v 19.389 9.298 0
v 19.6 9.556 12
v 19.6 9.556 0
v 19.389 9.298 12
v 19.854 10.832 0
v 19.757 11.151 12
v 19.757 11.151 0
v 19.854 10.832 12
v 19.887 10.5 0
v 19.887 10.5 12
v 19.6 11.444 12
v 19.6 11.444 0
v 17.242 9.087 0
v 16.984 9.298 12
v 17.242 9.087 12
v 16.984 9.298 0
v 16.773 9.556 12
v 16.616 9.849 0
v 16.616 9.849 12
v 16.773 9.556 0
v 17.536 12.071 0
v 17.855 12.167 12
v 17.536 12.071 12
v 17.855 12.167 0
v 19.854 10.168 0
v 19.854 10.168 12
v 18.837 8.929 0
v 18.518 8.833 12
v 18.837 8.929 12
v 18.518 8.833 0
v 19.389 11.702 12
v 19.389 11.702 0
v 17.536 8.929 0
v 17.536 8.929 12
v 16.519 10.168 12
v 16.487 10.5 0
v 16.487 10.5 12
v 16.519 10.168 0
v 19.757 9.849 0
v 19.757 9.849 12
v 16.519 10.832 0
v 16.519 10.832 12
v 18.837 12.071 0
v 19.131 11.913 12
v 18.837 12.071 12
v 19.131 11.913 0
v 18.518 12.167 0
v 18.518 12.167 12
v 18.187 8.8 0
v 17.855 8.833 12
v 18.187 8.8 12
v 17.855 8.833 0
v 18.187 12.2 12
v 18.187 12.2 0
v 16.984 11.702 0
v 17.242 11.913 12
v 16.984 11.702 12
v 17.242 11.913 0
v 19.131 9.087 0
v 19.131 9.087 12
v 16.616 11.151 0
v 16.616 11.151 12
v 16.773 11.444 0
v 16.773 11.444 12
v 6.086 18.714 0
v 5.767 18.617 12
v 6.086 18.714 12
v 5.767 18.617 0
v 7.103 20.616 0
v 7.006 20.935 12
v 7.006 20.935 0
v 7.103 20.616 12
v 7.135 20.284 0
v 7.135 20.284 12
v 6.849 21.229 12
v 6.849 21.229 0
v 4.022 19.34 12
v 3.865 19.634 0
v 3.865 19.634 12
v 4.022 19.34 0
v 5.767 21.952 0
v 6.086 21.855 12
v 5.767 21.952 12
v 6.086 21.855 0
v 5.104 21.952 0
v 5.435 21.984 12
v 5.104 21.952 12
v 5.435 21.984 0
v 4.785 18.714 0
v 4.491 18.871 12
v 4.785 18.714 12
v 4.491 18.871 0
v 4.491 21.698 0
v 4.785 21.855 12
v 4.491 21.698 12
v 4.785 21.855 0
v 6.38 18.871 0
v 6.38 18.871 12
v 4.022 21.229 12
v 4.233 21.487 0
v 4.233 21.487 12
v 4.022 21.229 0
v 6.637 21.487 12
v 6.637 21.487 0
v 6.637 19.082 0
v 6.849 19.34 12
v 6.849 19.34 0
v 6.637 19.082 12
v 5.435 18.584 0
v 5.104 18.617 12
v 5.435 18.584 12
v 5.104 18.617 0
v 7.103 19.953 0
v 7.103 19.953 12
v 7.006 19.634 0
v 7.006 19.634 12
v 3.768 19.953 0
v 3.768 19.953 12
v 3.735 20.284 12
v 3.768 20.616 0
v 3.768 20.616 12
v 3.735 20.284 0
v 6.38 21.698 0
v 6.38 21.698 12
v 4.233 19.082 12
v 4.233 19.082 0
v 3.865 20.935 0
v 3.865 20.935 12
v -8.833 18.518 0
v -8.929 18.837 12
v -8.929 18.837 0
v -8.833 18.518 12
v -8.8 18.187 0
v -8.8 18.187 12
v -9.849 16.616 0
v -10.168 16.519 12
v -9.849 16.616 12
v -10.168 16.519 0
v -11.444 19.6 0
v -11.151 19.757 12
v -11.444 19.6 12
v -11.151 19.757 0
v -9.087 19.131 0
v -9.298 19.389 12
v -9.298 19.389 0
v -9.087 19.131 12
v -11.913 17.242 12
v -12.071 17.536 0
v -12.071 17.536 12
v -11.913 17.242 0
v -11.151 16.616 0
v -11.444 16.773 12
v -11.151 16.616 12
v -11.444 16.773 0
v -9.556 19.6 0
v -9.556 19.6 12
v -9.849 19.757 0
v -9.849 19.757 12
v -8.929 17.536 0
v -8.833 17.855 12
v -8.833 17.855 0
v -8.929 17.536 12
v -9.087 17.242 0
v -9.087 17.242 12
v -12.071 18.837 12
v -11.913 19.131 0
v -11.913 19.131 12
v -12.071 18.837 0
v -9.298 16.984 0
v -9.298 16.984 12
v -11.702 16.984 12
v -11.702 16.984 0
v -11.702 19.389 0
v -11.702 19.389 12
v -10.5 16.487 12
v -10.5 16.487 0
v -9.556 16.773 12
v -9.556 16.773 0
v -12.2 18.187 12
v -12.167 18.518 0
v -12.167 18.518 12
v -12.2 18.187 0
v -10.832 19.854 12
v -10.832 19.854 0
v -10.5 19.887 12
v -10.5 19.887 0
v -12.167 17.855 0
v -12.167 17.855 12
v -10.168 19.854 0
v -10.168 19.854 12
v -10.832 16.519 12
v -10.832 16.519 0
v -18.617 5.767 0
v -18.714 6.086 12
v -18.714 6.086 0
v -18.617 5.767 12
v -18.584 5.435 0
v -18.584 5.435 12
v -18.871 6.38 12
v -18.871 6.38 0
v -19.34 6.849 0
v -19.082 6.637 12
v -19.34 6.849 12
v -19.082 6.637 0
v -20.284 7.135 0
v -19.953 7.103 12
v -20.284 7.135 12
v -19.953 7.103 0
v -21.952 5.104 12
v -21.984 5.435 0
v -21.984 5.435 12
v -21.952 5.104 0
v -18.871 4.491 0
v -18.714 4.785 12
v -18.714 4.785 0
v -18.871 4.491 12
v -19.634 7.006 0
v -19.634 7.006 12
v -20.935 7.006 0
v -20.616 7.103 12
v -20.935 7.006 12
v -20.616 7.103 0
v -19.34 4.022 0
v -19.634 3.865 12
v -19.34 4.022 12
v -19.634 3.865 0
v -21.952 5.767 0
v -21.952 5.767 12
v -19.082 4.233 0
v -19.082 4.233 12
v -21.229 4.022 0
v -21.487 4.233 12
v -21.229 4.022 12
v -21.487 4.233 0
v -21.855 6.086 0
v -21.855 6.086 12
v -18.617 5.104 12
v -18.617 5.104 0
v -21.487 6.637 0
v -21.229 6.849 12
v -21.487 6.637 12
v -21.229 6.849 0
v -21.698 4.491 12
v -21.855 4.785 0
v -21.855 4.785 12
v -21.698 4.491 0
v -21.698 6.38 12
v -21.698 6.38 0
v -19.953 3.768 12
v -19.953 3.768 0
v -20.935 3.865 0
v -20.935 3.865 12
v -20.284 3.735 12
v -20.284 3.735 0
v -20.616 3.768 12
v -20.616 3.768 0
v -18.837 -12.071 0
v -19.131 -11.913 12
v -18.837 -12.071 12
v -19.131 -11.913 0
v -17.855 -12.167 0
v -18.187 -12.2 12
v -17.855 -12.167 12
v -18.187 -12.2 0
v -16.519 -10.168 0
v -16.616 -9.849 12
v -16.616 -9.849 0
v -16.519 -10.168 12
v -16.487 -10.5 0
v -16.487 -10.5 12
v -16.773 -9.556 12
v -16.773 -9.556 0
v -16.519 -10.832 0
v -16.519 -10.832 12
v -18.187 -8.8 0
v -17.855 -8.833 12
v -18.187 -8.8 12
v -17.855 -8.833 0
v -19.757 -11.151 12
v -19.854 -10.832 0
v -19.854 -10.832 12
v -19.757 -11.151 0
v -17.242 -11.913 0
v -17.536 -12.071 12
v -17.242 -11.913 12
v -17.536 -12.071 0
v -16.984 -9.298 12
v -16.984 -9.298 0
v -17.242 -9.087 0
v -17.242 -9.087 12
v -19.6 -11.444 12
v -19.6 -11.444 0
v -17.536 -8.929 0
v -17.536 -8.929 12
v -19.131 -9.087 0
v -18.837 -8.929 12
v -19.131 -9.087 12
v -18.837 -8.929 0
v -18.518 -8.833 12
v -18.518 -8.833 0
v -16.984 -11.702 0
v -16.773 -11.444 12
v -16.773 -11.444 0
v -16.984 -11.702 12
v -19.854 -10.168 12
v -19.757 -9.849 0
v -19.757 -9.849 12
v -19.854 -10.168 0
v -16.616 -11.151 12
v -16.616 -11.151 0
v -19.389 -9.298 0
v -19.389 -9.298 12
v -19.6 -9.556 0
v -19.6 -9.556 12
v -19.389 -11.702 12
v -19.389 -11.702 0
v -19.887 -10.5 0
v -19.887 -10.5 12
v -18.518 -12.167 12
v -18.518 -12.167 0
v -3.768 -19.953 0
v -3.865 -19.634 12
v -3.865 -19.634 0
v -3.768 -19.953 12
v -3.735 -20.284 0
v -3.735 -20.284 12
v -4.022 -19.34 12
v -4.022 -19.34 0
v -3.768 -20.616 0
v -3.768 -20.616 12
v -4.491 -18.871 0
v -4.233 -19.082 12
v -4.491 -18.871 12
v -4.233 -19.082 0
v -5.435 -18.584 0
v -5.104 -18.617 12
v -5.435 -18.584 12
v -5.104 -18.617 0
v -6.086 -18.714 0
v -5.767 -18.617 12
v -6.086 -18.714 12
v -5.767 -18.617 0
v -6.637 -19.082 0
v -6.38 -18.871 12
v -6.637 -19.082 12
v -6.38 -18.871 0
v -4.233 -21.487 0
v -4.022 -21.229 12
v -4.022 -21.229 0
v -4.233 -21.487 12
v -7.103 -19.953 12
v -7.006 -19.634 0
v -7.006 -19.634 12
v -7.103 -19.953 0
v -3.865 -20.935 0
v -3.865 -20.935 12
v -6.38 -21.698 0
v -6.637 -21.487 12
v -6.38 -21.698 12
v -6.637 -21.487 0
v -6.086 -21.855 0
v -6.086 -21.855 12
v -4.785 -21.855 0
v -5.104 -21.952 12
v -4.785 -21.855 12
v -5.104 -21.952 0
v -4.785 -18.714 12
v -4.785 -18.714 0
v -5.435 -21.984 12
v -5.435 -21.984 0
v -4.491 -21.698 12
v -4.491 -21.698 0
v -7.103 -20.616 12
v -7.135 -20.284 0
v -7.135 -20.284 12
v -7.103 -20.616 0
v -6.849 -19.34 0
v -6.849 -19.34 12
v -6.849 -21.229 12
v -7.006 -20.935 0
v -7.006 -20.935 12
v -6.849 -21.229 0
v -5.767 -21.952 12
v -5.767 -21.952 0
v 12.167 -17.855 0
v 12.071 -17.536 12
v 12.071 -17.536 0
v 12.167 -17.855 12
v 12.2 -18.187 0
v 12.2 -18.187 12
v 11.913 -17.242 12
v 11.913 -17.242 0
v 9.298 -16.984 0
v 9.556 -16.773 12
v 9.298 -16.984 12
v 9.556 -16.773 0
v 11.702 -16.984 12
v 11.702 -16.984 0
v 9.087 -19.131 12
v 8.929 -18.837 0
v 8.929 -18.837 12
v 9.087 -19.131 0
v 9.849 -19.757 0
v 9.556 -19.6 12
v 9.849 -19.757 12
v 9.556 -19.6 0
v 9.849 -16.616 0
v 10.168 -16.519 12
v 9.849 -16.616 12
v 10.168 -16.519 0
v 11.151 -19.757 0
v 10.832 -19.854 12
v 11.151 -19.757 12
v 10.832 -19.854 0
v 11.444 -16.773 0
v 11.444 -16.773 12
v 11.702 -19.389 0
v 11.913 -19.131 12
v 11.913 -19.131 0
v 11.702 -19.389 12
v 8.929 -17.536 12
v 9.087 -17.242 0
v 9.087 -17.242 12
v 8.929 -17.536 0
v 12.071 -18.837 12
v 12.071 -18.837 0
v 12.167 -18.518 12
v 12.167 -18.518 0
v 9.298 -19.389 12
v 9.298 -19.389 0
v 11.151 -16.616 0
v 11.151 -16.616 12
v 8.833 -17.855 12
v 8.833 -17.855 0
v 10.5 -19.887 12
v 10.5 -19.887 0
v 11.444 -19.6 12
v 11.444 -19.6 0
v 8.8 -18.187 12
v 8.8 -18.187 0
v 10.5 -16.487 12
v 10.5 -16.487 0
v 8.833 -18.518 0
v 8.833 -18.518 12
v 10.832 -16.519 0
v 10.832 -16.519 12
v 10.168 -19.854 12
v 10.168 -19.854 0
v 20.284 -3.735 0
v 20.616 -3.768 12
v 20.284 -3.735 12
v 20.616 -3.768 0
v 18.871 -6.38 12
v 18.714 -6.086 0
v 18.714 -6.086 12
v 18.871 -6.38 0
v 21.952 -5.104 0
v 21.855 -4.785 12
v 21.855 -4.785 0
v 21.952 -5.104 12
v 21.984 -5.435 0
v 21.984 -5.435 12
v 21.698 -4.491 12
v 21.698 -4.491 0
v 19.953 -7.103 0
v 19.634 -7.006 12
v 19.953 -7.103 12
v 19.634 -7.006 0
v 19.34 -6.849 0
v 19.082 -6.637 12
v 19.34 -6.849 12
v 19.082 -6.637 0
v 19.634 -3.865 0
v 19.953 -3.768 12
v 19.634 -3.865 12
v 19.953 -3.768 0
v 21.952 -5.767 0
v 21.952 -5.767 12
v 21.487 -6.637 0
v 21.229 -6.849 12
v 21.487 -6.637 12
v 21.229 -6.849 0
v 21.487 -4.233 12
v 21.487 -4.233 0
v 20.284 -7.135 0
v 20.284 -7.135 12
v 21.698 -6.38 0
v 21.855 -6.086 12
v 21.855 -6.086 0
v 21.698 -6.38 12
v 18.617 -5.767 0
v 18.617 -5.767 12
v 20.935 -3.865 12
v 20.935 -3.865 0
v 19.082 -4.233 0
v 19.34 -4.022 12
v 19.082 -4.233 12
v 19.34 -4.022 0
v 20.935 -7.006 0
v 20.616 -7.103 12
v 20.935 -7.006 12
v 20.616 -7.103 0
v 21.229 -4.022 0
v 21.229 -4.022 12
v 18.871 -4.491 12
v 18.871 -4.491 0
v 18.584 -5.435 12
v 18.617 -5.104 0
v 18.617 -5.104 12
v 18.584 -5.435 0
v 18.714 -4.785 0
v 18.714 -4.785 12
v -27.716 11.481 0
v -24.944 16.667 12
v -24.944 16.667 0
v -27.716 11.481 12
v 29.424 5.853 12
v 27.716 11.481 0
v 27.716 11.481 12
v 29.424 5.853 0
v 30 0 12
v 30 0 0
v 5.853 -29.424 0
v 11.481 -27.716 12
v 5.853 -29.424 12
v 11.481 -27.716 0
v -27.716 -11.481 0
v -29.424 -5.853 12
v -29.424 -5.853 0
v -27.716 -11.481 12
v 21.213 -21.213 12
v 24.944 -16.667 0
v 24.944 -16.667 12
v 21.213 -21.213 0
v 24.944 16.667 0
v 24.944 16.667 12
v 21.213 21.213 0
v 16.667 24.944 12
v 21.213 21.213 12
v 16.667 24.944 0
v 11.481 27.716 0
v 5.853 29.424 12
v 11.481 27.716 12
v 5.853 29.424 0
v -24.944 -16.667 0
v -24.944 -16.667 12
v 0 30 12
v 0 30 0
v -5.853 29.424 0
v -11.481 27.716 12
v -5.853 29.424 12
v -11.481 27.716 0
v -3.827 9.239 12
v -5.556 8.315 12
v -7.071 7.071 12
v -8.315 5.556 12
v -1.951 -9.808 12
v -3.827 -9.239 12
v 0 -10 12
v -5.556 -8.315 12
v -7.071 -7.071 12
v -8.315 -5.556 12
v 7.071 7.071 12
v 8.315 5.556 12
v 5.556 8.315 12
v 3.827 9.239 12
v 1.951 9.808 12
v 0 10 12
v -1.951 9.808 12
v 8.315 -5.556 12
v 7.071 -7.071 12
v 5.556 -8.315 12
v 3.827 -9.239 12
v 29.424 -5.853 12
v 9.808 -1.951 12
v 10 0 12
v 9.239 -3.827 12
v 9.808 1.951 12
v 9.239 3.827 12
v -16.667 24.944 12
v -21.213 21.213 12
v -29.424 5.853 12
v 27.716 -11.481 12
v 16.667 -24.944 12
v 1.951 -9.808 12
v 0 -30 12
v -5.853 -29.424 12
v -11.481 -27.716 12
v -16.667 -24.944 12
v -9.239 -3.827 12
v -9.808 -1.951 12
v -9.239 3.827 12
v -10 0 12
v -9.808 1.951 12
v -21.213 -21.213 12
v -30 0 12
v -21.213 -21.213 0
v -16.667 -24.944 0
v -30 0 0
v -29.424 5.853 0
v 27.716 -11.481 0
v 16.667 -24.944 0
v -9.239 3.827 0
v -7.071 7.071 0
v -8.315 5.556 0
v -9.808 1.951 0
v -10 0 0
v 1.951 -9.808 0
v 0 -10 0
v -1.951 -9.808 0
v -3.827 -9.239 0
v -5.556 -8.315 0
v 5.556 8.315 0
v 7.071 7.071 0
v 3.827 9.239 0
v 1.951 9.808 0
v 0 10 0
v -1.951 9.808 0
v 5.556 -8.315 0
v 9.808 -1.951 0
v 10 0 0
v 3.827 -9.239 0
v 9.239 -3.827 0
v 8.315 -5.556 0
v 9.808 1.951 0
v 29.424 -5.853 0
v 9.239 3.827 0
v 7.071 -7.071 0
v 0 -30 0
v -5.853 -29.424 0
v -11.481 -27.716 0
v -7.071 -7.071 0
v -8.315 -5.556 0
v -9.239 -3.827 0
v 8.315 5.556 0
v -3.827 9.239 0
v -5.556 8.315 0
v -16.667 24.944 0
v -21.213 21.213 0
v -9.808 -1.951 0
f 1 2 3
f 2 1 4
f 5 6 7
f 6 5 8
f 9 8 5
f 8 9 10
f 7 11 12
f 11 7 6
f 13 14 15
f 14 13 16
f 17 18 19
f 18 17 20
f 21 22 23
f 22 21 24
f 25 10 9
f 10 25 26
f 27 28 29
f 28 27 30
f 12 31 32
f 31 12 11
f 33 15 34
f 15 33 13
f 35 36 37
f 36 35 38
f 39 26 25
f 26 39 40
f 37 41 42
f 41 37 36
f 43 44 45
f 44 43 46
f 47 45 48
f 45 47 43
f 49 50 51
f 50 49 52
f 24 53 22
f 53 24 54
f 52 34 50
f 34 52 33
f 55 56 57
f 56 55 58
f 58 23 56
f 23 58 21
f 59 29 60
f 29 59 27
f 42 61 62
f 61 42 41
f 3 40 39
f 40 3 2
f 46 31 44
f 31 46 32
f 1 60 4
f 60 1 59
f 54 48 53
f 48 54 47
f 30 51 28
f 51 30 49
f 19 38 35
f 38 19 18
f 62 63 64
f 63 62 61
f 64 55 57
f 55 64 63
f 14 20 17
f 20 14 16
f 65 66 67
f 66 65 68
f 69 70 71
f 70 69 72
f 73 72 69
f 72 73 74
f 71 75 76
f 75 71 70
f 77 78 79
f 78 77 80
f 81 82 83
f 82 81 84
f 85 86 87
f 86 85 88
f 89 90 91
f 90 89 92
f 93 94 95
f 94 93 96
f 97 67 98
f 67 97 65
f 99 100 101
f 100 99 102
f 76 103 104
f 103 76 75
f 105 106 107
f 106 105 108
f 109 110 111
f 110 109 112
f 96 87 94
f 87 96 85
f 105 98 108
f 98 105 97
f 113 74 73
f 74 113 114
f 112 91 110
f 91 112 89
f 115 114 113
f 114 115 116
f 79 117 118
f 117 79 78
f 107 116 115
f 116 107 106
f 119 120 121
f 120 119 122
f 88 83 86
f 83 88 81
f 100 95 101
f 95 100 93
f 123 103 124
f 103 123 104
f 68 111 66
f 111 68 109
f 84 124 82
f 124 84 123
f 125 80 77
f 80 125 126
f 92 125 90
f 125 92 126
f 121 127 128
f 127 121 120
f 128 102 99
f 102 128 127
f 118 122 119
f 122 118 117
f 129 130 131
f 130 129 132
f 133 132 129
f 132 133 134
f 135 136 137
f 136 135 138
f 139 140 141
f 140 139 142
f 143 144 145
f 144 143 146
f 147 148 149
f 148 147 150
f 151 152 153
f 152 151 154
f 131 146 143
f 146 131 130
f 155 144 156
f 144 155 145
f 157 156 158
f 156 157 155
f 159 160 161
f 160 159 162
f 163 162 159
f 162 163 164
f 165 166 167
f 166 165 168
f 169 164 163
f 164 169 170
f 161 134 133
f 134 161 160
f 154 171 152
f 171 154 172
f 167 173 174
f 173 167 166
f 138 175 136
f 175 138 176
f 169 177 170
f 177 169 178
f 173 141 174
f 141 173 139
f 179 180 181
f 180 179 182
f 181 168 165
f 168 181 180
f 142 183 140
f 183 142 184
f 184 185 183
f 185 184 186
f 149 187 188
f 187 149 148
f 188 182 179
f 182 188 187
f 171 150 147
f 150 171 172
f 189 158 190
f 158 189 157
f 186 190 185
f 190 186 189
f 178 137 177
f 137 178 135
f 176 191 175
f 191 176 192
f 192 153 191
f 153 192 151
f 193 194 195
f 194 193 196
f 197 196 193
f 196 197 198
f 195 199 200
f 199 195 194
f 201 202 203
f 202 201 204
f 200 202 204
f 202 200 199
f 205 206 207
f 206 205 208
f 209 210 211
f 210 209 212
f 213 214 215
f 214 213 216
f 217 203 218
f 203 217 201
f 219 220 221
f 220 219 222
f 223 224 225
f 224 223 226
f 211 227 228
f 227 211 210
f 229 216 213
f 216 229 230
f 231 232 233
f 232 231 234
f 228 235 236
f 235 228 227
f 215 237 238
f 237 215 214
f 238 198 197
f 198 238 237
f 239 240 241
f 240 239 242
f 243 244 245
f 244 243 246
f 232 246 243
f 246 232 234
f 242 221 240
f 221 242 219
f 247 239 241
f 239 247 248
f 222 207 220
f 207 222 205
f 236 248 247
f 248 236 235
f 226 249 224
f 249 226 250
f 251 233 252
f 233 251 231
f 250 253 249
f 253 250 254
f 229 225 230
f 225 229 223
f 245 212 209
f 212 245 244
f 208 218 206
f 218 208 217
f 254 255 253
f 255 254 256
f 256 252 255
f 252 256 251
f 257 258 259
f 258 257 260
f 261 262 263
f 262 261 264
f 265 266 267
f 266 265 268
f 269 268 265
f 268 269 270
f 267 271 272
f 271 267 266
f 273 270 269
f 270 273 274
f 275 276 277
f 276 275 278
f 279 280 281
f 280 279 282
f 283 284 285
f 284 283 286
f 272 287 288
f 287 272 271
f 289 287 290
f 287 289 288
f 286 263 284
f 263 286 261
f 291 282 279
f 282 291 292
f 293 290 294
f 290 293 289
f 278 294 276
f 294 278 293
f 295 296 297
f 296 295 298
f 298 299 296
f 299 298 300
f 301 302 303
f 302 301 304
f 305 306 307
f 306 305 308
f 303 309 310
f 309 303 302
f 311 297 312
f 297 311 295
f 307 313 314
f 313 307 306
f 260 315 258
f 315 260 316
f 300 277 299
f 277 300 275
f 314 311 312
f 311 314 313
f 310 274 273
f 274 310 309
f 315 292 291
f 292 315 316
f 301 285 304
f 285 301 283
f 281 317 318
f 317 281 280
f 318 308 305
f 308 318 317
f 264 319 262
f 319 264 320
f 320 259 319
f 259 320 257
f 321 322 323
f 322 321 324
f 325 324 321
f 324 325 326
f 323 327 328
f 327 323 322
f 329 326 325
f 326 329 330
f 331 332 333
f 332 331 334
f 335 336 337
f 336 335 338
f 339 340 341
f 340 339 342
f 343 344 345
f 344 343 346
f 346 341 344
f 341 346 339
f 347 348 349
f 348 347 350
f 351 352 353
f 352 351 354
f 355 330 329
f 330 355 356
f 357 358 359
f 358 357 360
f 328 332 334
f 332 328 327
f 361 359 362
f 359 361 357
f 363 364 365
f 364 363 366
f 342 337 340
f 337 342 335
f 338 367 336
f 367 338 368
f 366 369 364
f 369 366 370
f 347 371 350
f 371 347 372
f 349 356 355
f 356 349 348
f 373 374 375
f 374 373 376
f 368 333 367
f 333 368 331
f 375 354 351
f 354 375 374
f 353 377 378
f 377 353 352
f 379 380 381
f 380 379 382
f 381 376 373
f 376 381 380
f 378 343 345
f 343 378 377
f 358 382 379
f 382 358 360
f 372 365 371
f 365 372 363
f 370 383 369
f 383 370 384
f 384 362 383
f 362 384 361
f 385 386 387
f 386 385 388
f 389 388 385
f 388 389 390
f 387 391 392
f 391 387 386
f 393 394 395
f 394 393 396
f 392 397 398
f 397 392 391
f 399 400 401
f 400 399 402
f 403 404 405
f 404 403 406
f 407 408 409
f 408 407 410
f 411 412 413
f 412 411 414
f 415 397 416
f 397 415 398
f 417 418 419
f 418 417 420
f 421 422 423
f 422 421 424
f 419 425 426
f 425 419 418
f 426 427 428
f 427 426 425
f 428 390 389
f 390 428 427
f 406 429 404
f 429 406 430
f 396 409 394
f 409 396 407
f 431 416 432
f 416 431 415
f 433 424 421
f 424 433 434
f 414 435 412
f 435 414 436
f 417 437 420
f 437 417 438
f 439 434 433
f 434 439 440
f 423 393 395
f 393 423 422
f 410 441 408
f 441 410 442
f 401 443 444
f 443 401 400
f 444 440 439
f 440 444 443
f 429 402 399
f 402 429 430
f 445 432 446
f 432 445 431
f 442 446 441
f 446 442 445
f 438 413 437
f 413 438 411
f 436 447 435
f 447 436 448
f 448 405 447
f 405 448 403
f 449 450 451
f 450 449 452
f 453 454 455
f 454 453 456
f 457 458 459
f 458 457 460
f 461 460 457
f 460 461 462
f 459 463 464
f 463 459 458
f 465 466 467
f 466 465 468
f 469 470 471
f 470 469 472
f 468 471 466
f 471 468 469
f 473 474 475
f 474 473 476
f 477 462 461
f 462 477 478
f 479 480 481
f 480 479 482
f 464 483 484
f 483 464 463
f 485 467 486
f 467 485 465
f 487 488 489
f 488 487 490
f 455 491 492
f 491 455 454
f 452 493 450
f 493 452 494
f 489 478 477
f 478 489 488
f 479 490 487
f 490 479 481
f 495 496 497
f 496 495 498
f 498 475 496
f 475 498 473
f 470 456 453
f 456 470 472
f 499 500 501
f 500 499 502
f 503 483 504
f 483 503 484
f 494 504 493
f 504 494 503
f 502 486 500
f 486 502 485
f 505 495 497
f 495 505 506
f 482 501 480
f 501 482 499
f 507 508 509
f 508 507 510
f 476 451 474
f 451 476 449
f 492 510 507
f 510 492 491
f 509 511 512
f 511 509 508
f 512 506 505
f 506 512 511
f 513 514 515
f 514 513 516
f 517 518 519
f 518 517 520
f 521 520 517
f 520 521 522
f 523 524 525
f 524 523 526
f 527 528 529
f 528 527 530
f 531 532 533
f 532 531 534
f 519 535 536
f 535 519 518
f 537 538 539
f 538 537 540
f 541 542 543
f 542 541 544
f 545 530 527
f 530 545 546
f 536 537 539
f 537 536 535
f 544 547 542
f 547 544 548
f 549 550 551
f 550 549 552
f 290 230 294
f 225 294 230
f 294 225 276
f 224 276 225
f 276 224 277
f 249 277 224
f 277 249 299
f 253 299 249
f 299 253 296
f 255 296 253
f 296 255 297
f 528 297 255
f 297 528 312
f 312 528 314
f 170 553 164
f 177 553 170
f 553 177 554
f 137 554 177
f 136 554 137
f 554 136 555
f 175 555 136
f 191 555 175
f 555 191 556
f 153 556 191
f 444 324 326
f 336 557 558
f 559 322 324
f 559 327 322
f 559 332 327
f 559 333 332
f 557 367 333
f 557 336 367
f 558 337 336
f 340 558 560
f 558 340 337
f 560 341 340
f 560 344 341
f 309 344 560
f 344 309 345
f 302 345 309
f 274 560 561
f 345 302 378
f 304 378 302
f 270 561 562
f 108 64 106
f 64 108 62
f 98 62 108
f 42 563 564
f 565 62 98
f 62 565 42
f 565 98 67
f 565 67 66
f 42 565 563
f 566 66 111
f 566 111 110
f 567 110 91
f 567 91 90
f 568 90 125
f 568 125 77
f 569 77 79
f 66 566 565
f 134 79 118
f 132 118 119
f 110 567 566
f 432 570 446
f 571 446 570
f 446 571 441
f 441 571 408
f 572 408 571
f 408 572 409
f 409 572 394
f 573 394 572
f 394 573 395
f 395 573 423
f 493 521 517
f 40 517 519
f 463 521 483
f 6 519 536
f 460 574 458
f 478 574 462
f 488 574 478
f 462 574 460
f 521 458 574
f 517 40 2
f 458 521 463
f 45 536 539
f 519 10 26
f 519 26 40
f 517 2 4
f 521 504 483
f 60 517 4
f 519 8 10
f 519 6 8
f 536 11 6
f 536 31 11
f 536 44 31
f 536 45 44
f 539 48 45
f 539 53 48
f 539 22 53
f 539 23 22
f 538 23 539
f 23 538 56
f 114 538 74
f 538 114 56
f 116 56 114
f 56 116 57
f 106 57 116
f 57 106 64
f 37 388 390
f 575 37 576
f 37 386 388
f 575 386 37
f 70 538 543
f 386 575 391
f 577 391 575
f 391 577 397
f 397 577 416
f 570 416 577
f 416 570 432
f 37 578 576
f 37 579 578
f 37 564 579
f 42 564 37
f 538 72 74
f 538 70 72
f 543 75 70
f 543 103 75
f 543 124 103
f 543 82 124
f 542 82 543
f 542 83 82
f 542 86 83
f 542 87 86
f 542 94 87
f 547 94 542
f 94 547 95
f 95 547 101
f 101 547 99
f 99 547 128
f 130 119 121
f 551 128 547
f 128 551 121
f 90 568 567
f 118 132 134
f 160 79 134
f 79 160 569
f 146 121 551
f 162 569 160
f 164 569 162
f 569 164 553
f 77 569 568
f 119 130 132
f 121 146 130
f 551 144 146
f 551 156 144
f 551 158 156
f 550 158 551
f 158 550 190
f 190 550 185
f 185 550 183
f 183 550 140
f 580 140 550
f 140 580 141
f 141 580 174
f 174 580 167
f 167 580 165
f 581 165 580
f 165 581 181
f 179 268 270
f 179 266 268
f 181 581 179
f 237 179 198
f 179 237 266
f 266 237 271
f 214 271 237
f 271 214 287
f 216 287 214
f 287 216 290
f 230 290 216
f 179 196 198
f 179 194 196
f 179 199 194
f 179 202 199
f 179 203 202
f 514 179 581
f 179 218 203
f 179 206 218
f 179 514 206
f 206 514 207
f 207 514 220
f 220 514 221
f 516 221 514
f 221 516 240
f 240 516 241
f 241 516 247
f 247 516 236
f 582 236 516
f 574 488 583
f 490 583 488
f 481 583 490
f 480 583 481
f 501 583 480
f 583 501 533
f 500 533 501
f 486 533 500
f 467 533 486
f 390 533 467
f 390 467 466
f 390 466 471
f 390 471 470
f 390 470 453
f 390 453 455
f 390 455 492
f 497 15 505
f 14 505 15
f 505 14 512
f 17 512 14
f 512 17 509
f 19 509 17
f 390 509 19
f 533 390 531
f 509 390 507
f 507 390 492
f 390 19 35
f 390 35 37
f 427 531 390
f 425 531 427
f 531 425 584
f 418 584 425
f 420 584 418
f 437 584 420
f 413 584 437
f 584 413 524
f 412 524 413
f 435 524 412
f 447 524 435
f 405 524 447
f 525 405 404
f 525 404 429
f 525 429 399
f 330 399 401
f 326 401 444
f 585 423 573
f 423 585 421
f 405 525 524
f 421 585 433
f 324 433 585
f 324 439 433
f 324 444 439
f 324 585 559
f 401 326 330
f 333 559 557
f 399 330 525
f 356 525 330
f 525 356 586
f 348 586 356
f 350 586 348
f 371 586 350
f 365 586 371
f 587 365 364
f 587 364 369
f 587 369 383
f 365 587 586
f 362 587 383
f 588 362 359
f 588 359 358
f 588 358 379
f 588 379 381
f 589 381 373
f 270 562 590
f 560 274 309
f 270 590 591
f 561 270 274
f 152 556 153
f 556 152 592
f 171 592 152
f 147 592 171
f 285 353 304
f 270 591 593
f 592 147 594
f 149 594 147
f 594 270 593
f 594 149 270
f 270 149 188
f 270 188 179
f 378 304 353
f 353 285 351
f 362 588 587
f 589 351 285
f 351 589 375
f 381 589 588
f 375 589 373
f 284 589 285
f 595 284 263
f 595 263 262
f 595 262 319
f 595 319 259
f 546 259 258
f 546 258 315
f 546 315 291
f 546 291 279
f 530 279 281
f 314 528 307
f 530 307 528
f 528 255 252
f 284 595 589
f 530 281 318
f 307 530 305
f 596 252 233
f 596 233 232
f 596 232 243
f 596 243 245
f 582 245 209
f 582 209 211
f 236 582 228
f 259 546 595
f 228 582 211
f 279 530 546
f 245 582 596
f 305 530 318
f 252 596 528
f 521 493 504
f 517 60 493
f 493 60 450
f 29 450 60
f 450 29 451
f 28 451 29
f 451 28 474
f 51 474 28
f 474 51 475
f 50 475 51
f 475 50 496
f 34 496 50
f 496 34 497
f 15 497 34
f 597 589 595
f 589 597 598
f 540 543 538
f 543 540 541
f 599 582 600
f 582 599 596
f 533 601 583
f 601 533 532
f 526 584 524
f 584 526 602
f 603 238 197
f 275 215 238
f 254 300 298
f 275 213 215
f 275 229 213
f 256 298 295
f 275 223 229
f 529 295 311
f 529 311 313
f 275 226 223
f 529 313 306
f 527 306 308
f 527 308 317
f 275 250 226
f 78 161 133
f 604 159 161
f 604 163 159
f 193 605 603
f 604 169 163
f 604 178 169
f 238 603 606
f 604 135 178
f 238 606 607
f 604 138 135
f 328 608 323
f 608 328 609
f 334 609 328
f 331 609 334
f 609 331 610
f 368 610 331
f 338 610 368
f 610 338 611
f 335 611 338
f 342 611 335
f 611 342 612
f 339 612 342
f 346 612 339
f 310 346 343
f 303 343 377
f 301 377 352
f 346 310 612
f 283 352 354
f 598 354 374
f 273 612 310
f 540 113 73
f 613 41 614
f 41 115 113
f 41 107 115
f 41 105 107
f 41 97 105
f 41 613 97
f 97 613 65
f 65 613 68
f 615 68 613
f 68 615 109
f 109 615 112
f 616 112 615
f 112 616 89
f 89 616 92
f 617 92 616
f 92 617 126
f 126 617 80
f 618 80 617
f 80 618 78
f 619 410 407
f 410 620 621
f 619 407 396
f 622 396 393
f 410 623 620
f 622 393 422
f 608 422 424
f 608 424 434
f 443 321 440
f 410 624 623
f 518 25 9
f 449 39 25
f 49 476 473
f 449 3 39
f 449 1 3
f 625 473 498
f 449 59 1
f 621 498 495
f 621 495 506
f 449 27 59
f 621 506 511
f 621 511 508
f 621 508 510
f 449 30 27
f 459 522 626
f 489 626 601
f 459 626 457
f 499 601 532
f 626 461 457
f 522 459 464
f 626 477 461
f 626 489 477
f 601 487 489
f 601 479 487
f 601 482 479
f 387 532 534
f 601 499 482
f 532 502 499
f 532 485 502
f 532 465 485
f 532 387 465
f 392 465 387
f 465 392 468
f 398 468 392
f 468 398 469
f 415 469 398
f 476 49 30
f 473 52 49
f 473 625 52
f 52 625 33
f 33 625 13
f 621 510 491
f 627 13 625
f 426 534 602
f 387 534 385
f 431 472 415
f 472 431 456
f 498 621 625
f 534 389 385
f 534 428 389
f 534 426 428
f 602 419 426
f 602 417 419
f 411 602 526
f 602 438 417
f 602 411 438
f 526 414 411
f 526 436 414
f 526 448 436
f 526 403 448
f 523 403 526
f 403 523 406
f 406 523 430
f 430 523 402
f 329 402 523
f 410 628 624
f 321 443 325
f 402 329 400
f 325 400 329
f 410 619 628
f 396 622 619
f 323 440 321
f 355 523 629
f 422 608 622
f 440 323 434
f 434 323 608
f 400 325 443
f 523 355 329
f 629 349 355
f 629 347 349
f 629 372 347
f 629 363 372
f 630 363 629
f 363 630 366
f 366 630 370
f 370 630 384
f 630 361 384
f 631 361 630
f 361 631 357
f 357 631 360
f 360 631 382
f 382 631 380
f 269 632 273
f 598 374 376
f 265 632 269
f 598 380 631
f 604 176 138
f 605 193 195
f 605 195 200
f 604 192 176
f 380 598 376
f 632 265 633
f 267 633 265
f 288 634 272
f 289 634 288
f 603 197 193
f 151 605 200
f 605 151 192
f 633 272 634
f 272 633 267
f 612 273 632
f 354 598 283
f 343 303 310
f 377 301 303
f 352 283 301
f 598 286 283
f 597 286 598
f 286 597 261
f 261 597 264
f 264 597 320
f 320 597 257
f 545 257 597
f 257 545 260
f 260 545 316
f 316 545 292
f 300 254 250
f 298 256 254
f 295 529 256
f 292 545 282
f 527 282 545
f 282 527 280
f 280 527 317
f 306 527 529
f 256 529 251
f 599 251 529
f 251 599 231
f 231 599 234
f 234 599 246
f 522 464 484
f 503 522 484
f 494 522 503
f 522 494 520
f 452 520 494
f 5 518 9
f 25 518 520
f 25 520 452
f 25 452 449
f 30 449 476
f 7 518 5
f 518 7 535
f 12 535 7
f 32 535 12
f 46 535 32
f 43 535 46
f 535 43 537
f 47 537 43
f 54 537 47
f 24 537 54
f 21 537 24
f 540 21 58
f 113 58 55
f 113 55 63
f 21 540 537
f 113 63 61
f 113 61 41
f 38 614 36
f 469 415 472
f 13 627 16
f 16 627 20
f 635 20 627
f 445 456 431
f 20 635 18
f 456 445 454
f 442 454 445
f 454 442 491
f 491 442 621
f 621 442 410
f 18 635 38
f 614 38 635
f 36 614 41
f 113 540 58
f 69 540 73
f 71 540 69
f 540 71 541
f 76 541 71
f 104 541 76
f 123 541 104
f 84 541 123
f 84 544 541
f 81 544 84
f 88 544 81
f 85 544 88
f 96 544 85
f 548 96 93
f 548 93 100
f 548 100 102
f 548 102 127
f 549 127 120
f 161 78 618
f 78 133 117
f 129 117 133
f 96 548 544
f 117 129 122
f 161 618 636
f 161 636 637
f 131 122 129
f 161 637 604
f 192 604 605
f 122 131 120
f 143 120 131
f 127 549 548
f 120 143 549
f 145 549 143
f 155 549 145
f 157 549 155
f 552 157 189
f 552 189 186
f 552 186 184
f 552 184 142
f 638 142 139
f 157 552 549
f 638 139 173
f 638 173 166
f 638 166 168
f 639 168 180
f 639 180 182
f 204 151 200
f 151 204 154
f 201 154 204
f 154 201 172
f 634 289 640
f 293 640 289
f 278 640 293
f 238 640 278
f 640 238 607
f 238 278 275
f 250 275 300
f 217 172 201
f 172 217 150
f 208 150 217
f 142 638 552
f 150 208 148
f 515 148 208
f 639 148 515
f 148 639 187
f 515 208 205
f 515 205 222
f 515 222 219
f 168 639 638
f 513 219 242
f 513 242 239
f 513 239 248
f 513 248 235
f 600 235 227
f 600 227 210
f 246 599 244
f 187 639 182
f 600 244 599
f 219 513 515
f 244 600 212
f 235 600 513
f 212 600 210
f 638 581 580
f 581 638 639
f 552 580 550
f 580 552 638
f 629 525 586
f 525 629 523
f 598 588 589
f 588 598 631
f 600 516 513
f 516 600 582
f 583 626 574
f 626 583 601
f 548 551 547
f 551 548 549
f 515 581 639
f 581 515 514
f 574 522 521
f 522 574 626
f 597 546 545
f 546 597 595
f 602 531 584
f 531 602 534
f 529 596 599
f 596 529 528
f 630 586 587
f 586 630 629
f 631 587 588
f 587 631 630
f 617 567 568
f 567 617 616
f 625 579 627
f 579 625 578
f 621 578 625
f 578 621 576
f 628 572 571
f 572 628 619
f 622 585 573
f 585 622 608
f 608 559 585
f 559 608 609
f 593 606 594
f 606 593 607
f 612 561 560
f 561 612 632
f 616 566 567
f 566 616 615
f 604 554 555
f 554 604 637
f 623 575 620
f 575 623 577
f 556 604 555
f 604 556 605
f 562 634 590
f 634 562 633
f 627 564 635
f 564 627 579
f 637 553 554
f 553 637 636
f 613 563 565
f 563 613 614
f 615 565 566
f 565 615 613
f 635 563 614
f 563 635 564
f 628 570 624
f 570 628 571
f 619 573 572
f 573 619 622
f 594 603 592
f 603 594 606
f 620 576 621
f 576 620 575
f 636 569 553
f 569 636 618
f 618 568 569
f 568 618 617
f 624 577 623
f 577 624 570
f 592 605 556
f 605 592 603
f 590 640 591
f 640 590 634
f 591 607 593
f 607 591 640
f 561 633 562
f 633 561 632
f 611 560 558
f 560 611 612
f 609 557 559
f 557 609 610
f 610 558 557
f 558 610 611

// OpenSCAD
$fn = 32;

// ----------------------------------------------------------------------
// Flange Ø60 x 12
// 8 holes on a Ø42 bolt circle, bolted joints
// ----------------------------------------------------------------------

// --- parameters (mm) ---
flange_d = 60;   // outside diameter of the flange
thickness = 12;  // flange thickness
holes = 8;       // number of bolt holes
pcd = 42;        // bolt circle diameter
start_deg = 30;  // angle of the first hole, from +X
hole_d = 3.4;    // bolt hole diameter
bore_d = 20;     // central through bore
hub_d = 28;      // hub outside diameter
hub_h = 0;       // hub height above the flange face (0 = no hub)

// --- derived feature positions (mm) ---
height = thickness + hub_h;  // = 12   overall height of the part
pcd_r = pcd / 2;             // = 21   bolt circle radius
hole_step = 360 / holes;     // = 45   angular pitch
feature_centers = [
  [pcd_r * cos(start_deg + 0 * hole_step), pcd_r * sin(start_deg + 0 * hole_step)],
  [pcd_r * cos(start_deg + 1 * hole_step), pcd_r * sin(start_deg + 1 * hole_step)],
  [pcd_r * cos(start_deg + 2 * hole_step), pcd_r * sin(start_deg + 2 * hole_step)],
  [pcd_r * cos(start_deg + 3 * hole_step), pcd_r * sin(start_deg + 3 * hole_step)],
  [pcd_r * cos(start_deg + 4 * hole_step), pcd_r * sin(start_deg + 4 * hole_step)],
  [pcd_r * cos(start_deg + 5 * hole_step), pcd_r * sin(start_deg + 5 * hole_step)],
  [pcd_r * cos(start_deg + 6 * hole_step), pcd_r * sin(start_deg + 6 * hole_step)],
  [pcd_r * cos(start_deg + 7 * hole_step), pcd_r * sin(start_deg + 7 * hole_step)]
];   // bolt hole centres on the pitch circle

// flange disc, every hole and the bore cut straight through
difference() {
  union() {
    cylinder(d = flange_d, h = thickness);
  }
  translate([0, 0, -1]) cylinder(d = bore_d, h = height + 2);  // bore, through
  for (centre = feature_centers)
    translate([centre[0], centre[1], -1]) cylinder(d = hole_d, h = thickness + 2);
}
